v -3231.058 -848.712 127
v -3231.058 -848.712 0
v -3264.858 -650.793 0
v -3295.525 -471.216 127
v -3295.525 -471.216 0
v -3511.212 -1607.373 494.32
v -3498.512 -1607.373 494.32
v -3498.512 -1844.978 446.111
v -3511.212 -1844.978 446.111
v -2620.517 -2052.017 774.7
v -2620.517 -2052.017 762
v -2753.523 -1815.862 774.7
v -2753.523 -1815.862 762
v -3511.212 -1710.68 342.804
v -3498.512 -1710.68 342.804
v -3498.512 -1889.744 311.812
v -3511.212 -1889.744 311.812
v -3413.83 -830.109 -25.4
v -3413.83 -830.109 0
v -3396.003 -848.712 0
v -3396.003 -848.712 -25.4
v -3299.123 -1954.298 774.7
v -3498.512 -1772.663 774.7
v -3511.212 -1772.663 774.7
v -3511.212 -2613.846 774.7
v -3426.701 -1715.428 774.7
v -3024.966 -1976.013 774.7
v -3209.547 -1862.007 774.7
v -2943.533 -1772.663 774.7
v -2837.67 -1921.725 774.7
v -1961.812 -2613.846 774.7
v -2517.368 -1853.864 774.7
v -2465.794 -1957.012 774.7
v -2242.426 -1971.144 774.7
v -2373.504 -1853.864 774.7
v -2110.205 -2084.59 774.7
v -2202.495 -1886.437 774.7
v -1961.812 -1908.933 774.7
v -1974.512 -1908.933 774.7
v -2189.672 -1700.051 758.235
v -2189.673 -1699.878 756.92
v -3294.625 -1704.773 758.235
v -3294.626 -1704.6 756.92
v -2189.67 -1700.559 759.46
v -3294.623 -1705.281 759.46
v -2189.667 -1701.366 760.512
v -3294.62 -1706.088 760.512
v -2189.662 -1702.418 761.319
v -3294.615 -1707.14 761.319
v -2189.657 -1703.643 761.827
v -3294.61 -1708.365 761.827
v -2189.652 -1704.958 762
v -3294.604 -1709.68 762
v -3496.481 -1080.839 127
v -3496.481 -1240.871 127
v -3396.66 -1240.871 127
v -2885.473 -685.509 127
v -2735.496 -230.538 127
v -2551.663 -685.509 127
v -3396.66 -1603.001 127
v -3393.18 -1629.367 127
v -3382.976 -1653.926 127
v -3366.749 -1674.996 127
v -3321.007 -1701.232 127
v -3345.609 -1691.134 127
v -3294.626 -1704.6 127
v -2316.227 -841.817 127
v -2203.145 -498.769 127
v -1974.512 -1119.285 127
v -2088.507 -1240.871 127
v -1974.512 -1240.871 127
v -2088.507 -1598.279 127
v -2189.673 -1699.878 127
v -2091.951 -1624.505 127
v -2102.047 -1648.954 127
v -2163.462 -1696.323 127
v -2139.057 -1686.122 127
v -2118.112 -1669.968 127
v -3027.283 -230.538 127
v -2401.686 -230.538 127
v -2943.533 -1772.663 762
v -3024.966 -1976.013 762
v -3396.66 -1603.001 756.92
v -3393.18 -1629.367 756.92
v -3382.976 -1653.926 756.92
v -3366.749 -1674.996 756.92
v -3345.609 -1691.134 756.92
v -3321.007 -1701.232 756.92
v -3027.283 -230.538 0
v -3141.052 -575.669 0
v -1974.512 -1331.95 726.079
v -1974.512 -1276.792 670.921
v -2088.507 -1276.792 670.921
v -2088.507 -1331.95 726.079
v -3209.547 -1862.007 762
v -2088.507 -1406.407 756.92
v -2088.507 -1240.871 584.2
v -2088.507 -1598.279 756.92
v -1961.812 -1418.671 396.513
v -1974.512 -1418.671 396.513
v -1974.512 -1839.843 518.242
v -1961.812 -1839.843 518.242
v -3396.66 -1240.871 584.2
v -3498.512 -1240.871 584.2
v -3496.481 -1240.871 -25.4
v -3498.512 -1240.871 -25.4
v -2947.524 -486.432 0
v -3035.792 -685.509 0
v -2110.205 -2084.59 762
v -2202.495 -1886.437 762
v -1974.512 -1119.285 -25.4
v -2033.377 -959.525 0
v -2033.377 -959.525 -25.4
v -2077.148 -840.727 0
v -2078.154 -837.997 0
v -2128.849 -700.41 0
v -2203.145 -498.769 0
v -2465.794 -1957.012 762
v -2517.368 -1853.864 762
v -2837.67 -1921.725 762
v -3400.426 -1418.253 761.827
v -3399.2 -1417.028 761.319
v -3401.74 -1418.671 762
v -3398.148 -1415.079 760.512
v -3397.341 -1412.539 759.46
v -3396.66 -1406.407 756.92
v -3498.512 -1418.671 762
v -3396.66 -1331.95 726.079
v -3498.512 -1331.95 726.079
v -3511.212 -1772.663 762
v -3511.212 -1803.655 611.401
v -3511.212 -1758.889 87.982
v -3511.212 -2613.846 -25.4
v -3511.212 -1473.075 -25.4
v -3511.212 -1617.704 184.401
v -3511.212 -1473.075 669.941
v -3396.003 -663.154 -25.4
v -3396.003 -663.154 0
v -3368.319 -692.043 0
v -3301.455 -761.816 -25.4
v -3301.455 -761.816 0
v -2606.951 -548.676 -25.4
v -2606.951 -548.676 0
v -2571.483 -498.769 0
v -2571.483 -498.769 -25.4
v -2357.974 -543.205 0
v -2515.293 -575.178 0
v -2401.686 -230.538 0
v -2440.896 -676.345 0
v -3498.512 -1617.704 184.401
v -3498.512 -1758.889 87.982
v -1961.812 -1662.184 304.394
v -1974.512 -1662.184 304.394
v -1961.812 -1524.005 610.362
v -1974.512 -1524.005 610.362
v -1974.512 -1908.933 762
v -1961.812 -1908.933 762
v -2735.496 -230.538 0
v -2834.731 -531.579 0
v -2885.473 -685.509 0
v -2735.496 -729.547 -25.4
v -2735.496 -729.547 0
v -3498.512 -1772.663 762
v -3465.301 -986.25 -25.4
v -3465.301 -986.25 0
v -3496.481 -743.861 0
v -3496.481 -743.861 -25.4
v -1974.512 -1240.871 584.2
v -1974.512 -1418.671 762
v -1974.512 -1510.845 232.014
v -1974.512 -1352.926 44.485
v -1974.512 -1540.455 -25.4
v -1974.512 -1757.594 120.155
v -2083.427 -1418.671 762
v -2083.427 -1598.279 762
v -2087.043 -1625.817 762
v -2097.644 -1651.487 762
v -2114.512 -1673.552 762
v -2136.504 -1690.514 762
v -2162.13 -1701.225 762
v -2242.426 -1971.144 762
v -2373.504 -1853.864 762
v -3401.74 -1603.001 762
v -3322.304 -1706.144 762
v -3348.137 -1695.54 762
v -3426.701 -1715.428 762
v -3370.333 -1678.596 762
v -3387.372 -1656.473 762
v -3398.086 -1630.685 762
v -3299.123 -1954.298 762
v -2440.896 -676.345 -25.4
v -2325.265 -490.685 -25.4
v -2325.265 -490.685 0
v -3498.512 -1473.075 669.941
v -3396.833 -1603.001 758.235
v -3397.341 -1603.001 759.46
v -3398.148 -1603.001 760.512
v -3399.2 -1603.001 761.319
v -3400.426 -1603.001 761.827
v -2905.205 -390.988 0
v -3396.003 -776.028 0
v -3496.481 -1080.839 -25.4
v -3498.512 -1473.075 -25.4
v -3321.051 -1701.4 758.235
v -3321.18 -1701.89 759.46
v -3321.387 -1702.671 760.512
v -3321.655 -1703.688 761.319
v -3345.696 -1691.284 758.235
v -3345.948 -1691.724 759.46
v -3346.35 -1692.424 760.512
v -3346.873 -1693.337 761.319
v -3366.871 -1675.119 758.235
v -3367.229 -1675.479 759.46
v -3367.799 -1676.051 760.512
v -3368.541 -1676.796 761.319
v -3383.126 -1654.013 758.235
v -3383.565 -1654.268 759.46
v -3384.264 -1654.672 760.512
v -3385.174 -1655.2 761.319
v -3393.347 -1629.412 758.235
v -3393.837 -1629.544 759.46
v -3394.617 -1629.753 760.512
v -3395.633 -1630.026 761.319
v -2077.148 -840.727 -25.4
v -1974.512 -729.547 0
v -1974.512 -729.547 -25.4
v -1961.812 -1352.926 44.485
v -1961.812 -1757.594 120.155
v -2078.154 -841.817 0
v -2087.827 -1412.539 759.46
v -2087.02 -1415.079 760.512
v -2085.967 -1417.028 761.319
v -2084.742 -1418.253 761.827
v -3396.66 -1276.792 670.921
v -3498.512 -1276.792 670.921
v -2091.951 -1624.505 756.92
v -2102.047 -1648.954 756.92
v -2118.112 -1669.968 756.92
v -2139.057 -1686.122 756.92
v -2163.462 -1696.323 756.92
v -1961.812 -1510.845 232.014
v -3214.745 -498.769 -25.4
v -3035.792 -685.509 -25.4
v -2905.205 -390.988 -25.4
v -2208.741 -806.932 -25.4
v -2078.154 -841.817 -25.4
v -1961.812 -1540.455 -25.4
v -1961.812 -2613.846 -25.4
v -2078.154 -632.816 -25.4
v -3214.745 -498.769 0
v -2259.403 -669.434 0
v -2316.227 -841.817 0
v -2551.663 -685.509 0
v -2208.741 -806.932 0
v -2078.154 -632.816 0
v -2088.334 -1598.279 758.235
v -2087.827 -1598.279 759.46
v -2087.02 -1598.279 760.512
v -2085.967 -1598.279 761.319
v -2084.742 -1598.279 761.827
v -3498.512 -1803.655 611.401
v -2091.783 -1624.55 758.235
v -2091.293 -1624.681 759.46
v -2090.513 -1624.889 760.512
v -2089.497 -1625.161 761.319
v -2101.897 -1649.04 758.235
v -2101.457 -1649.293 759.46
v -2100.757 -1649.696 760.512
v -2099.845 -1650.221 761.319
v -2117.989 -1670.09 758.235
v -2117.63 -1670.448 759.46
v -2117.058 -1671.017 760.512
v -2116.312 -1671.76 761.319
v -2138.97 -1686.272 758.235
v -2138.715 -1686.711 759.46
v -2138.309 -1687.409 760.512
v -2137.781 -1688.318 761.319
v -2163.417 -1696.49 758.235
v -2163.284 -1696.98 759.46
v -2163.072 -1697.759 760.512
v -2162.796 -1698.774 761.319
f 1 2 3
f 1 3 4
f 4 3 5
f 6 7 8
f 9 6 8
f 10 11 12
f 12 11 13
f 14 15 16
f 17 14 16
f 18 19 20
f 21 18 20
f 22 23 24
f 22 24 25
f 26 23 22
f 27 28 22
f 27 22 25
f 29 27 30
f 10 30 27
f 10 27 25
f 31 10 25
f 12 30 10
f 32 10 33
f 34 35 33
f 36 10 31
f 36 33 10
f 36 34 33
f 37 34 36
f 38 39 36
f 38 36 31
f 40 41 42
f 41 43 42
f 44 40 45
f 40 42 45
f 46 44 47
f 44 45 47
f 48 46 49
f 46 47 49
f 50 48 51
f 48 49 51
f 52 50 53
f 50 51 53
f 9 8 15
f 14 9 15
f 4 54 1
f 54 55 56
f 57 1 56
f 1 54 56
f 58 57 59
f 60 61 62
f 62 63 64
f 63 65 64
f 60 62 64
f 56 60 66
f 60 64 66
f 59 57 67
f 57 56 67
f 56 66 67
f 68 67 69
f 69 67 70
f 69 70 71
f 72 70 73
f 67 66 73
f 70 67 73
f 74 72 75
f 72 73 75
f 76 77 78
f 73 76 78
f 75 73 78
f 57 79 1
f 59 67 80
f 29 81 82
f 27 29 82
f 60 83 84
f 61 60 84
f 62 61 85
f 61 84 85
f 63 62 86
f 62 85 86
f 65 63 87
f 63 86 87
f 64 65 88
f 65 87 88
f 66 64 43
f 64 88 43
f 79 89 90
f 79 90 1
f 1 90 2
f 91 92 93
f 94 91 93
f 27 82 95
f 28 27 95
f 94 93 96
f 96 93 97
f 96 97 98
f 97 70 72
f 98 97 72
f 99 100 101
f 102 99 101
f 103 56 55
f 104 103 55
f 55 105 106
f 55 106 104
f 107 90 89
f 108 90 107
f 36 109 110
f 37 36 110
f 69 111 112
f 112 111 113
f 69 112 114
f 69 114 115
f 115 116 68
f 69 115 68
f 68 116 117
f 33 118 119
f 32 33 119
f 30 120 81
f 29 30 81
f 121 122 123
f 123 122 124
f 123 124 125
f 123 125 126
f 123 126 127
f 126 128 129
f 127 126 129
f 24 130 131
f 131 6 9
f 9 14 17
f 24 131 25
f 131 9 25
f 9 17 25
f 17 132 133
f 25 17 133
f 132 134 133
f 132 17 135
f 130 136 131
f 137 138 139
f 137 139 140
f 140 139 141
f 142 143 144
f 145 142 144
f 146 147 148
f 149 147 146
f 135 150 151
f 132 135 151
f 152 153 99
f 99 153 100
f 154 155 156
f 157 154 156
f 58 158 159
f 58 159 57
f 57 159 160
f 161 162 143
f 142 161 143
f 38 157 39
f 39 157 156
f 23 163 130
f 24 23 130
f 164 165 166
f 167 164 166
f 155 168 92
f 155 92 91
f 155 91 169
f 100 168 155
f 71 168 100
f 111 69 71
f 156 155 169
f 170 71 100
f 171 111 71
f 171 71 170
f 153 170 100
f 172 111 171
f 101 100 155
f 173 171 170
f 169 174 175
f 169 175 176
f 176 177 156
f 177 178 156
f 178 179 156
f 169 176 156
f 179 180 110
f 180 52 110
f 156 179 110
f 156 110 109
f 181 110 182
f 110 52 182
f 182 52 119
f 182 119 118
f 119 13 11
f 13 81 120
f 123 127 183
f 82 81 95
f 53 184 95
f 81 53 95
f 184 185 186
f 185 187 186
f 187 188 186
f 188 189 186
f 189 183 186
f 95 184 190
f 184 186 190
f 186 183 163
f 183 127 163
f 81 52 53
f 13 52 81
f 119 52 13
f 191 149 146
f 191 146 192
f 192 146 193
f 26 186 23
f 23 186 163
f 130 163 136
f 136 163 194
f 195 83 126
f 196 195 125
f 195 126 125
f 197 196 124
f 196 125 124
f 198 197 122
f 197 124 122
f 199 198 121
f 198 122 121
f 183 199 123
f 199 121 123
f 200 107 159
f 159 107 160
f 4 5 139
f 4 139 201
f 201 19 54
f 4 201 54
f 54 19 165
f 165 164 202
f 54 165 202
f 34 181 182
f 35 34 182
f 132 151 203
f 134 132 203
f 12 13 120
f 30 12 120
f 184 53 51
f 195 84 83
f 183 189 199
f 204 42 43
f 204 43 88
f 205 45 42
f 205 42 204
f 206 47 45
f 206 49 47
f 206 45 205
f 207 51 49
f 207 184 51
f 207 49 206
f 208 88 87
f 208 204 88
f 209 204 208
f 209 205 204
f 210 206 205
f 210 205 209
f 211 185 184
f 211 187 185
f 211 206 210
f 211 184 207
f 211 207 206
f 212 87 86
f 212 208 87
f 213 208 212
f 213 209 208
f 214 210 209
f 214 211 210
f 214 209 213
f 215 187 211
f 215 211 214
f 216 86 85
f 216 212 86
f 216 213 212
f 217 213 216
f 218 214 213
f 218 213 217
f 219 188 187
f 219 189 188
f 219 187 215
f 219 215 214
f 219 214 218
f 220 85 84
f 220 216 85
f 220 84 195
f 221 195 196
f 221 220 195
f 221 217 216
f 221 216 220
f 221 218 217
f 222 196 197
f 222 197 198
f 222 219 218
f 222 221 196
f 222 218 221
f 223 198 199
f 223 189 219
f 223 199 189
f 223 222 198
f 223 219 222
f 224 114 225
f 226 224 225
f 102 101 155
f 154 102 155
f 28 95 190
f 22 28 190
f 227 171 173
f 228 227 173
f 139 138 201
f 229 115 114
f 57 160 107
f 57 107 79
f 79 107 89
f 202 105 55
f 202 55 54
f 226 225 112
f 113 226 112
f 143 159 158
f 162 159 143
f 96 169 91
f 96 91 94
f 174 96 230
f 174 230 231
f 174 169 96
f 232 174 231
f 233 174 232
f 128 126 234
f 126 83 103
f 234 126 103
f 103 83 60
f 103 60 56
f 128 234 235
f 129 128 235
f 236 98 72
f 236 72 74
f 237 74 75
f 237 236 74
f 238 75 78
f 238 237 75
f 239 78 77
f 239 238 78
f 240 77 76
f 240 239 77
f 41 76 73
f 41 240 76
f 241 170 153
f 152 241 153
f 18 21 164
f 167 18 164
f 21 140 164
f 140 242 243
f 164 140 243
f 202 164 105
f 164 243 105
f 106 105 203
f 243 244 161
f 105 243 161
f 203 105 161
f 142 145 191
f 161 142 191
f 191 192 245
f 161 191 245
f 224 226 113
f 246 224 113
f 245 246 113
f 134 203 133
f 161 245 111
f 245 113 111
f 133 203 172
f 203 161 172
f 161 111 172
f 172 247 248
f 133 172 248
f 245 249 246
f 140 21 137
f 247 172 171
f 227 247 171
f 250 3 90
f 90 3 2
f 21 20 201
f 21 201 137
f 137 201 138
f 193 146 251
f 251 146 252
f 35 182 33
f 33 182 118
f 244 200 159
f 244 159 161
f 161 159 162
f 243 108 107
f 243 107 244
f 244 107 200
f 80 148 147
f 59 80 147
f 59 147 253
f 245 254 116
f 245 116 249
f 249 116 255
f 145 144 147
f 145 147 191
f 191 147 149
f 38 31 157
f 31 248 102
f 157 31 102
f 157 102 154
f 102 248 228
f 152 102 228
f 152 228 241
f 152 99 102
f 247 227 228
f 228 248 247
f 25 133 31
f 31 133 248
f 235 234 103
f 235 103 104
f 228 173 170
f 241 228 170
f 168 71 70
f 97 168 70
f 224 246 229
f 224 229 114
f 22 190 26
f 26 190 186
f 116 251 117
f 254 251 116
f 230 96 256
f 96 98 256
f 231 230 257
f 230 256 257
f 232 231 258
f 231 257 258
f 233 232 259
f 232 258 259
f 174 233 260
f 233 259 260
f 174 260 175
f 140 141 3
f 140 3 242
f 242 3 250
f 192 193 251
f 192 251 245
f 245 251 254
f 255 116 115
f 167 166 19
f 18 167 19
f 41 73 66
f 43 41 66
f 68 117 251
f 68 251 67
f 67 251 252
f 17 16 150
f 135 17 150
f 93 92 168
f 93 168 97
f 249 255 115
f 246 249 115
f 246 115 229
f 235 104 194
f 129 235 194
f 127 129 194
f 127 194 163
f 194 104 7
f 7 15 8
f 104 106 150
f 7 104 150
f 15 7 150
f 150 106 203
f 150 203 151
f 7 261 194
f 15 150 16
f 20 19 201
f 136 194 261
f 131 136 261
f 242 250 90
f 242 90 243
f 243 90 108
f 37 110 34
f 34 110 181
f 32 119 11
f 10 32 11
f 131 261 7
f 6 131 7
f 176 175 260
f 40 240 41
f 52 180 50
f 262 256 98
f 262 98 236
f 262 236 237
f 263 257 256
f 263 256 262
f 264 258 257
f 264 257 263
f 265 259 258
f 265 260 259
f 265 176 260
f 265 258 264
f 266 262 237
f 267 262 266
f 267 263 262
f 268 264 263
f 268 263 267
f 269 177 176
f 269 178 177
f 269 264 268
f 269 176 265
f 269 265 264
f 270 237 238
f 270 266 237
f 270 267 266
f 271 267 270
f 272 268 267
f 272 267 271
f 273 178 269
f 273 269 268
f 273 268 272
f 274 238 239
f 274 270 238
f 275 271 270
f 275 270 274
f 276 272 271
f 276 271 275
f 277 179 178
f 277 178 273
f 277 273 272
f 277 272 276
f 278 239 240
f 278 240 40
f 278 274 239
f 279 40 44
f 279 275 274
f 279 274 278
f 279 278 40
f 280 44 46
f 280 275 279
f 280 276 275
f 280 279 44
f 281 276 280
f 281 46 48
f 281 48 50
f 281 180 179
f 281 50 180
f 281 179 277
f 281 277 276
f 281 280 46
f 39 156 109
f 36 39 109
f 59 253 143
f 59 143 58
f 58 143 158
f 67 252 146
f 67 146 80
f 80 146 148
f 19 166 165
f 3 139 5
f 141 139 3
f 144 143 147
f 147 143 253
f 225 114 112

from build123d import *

# Parameters (mm, degrees)
F1_DEPTH  = 762
F3_DEPTH  = 127
F6_DEPTH  = 762.001
F8_DEPTH  = 25.4
F10_SIZE  = 127
F11_SIZE  = 50.8
F12_R     = 101.6
F13_R     = 5.08
F15_DEPTH = 12.7
F17_DEPTH = 12.7
F19_DEPTH = 12.7


with BuildPart() as f1:
    # F0 (on Top) → F1 (new body)
    with BuildSketch(Plane.XY):
        Polygon((-3498.5116661556, -1699.4458940506), (-3498.5116661556, -2613.8458940506), (-1974.5116661556, -2613.8458940506), (-1974.5116661556, -1699.4458940506), (-1974.5116661556, -1240.8709526062), (-2088.5074138641, -1240.8709526062), (-2088.5074138641, -1699.4458940506), (-3396.6603279114, -1705.0362136841), (-3396.6603279114, -1240.8709526062), (-3498.5116661556, -1240.8709526062), align=None)
    extrude(amount=F1_DEPTH)


with BuildPart() as f3:
    # F2 (on face) → F3 (new body)
    with BuildSketch(Plane(origin=(0, 0, 0), x_dir=(1, 0, 0), z_dir=(0, 0, -1))):
        Polygon((-1974.5116661556, 230.5383682251), (-1974.5116661556, 1240.8709526062), (-2088.5074138641, 1240.8709526062), (-2088.5074138641, 1699.4458940506), (-3396.6603279114, 1705.0362136841), (-3396.6603279114, 1240.8709526062), (-3496.481180191, 1240.8709526062), (-3496.481180191, 230.5383682251), align=None)
    extrude(amount=-F3_DEPTH)


with BuildPart() as f1_1:
    add(f1.part)

    # F4: union F3
    add(f3.part)

    # F5 (on face) → F6 (cut, through all)
    with BuildSketch(Plane(origin=(0, 0, 0), x_dir=(1, 0, 0), z_dir=(0, 0, -1))):
        Polygon((-2316.2273000234, 841.8166545124), (-2401.6864299774, 230.5383682251), (-1974.5116661556, 230.5383682251), (-1974.5116661556, 1119.2854642868), (-2203.1452655792, 498.7692832947), align=None)
        Polygon((-2735.4964231733, 230.5383682251), (-2401.6864299774, 230.5383682251), (-2551.6629219055, 685.5093240738), align=None)
        Polygon((-3496.481180191, 230.5383682251), (-3027.2831916809, 230.5383682251), (-3231.0576103647, 848.7115289264), (-3295.5253124237, 471.2162911892), (-3496.481180191, 1080.8390531707), align=None)
        Polygon((-3027.2831916809, 230.5383682251), (-2735.4964231733, 230.5383682251), (-2885.4729151014, 685.5093240738), align=None)
    extrude(amount=-F6_DEPTH, mode=Mode.SUBTRACT)


with BuildPart() as f8:
    # F7 (on face) → F8 (new body)
    with BuildSketch(Plane(origin=(0, 0, 0), x_dir=(1, 0, 0), z_dir=(0, 0, -1))):
        Polygon((-2905.2052497864, 390.9881711006), (-2834.7314291205, 531.5791842156), (-2885.4729151014, 685.5093240738), (-2947.5236220314, 486.4315835605), align=None)
        Polygon((-3214.7448062897, 498.7692832947), (-3141.0519449936, 575.6689801958), (-3231.0576103647, 848.7115289264), (-3264.8577193286, 650.7925747624), align=None)
        Polygon((-3413.8304513223, 830.1085511328), (-3465.3007291058, 986.2495648338), (-3496.481180191, 743.8611740208), align=None)
        Polygon((-3368.3185893378, 692.043077782), (-3396.0032463074, 776.02767218), (-3396.0032463074, 663.1536888734), align=None)
        Polygon((-2571.4828968048, 498.7692832947), (-2515.293202418, 575.1775925706), (-2551.6629219055, 685.5093240738), (-2606.951311997, 548.6756592969), align=None)
        Polygon((-2325.264623755, 490.6849679948), (-2259.4031983079, 669.4341994996), (-2316.2273000234, 841.8166545124), (-2357.9744639194, 543.2045013416), align=None)
        Polygon((-2078.1543254852, 837.9972051805), (-2128.849476835, 700.4095461938), (-2078.1543254852, 632.8159570694), align=None)
        Polygon((-2033.3765220407, 959.5250631011), (-2077.148481374, 840.727086301), (-1974.5116661556, 729.5470237732), align=None)
        Polygon((-2259.4031983079, 669.4341994996), (-2208.7411880493, 806.931912899), (-2128.849476835, 700.4095461938), (-2078.1543254852, 837.9972051805), (-2078.1543254852, 841.8166545124), (-2077.148481374, 840.727086301), (-2033.3765220407, 959.5250631011), (-1974.5116661556, 1119.2854642868), (-1974.5116661556, 2613.8458940506), (-3498.5116661556, 2613.8458940506), (-3498.5116661556, 1240.8709526062), (-3496.481180191, 1240.8709526062), (-3496.481180191, 1080.8390531707), (-3465.3007291058, 986.2495648338), (-3413.8304513223, 830.1085511328), (-3396.0032463074, 848.7115289264), (-3396.0032463074, 776.02767218), (-3368.3185893378, 692.043077782), (-3301.4554118653, 761.8158887578), (-3264.8577193286, 650.7925747624), (-3231.0576103647, 848.7115289264), (-3141.0519449936, 575.6689801958), (-3035.7921123505, 685.5093240738), (-2947.5236220314, 486.4315835605), (-2885.4729151014, 685.5093240738), (-2834.7314291205, 531.5791842156), (-2735.4964231733, 729.5470237732), (-2606.951311997, 548.6756592969), (-2551.6629219055, 685.5093240738), (-2515.293202418, 575.1775925706), (-2440.8960342407, 676.3449311256), (-2357.9744639194, 543.2045013416), (-2316.2273000234, 841.8166545124), align=None)
    extrude(amount=F8_DEPTH)

    # F9: union F1
    add(f1_1.part)

    # F10
    f10_edges = [f8.edges().sort_by_distance(p)[0] for p in [
        (-3447.585997, -1240.870953, 762),
        (-2031.50954, -1240.870953, 762),
    ]]
    chamfer(f10_edges, length=F10_SIZE)

    # F11
    f11_edges = [f8.edges().sort_by_distance(p)[0] for p in [
        (-2031.50954, -1240.870953, 635),
        (-2031.50954, -1367.870953, 762),
        (-3447.585997, -1240.870953, 635),
        (-3447.585997, -1367.870953, 762),
    ]]
    chamfer(f11_edges, length=F11_SIZE)

    # F12
    f12_edges = [f8.edges().sort_by_distance(p)[0] for p in [
        (-3396.660328, -1705.036214, 444.5),
        (-2088.507414, -1699.445894, 444.5),
    ]]
    fillet(f12_edges, radius=F12_R)

    # F13
    f13_edges = [f8.edges().sort_by_distance(p)[0] for p in [
        (-2742.149693, -1702.239198, 762),
    ]]
    fillet(f13_edges, radius=F13_R)

    # F14 (on face) → F15 (join)
    with BuildSketch(Plane.YZ.offset(-1974.5116661556)):
        Polygon((-1524.0049362183, 610.3619337082), (-1908.9328050613, 762), (-2613.8458940506, 762), (-2613.8458940506, -25.4), (-1540.454864502, -25.4), (-1352.9258966446, 44.4850027561), (-1757.5936317444, 120.1545894146), (-1510.8450651169, 232.0139855146), (-1662.1842384338, 304.3935894966), (-1418.6709526062, 396.5130746365), (-1839.8432731628, 518.242418766), align=None)
    extrude(amount=F15_DEPTH)

    # F16 (on face) → F17 (join)
    with BuildSketch(Plane(origin=(-3498.5116661556, 0, 0), x_dir=(0, -1, 0), z_dir=(-1, 0, 0))):
        Polygon((1758.8893175125, 87.9818573594), (1473.0749130249, -25.4), (2613.8458940506, -25.4), (2613.8458940506, 762), (1772.6634740829, 762), (1473.0749130249, 669.9413061142), (1803.6553859711, 611.4010214806), (1607.3732376099, 494.320422411), (1844.9779748917, 446.1107254028), (1710.6796503067, 342.8043425083), (1889.7440433502, 311.8124306202), (1617.7039146423, 184.4011843204), align=None)
    extrude(amount=F17_DEPTH)

    # F18 (on face) → F19 (join)
    with BuildSketch(Plane.XY.offset(762)):
        Polygon((-3426.700592041, -1715.4284715652), (-3498.5116661556, -1772.6634740829), (-3511.2116661556, -1772.6634740829), (-3511.2116661556, -2613.8458940506), (-1961.8116661556, -2613.8458940506), (-1961.8116661556, -1908.9328050613), (-1974.5116661556, -1908.9328050613), (-2110.2046966553, -2084.5901966095), (-2202.495098114, -1886.4371776581), (-2242.4262828624, -1971.1439244185), (-2373.5039234161, -1853.8640737534), (-2465.7943248749, -1957.012295723), (-2517.3683166504, -1853.8640737534), (-2620.51653862, -2052.0172119141), (-2753.523349762, -1815.8621788025), (-2837.6703262329, -1921.7246770859), (-2943.5329437256, -1772.6634740829), (-3024.965763092, -1976.0131835938), (-3209.5465660095, -1862.0073795319), (-3299.1225719452, -1954.2977809906), align=None)
    extrude(amount=F19_DEPTH)


solid = f8.part
